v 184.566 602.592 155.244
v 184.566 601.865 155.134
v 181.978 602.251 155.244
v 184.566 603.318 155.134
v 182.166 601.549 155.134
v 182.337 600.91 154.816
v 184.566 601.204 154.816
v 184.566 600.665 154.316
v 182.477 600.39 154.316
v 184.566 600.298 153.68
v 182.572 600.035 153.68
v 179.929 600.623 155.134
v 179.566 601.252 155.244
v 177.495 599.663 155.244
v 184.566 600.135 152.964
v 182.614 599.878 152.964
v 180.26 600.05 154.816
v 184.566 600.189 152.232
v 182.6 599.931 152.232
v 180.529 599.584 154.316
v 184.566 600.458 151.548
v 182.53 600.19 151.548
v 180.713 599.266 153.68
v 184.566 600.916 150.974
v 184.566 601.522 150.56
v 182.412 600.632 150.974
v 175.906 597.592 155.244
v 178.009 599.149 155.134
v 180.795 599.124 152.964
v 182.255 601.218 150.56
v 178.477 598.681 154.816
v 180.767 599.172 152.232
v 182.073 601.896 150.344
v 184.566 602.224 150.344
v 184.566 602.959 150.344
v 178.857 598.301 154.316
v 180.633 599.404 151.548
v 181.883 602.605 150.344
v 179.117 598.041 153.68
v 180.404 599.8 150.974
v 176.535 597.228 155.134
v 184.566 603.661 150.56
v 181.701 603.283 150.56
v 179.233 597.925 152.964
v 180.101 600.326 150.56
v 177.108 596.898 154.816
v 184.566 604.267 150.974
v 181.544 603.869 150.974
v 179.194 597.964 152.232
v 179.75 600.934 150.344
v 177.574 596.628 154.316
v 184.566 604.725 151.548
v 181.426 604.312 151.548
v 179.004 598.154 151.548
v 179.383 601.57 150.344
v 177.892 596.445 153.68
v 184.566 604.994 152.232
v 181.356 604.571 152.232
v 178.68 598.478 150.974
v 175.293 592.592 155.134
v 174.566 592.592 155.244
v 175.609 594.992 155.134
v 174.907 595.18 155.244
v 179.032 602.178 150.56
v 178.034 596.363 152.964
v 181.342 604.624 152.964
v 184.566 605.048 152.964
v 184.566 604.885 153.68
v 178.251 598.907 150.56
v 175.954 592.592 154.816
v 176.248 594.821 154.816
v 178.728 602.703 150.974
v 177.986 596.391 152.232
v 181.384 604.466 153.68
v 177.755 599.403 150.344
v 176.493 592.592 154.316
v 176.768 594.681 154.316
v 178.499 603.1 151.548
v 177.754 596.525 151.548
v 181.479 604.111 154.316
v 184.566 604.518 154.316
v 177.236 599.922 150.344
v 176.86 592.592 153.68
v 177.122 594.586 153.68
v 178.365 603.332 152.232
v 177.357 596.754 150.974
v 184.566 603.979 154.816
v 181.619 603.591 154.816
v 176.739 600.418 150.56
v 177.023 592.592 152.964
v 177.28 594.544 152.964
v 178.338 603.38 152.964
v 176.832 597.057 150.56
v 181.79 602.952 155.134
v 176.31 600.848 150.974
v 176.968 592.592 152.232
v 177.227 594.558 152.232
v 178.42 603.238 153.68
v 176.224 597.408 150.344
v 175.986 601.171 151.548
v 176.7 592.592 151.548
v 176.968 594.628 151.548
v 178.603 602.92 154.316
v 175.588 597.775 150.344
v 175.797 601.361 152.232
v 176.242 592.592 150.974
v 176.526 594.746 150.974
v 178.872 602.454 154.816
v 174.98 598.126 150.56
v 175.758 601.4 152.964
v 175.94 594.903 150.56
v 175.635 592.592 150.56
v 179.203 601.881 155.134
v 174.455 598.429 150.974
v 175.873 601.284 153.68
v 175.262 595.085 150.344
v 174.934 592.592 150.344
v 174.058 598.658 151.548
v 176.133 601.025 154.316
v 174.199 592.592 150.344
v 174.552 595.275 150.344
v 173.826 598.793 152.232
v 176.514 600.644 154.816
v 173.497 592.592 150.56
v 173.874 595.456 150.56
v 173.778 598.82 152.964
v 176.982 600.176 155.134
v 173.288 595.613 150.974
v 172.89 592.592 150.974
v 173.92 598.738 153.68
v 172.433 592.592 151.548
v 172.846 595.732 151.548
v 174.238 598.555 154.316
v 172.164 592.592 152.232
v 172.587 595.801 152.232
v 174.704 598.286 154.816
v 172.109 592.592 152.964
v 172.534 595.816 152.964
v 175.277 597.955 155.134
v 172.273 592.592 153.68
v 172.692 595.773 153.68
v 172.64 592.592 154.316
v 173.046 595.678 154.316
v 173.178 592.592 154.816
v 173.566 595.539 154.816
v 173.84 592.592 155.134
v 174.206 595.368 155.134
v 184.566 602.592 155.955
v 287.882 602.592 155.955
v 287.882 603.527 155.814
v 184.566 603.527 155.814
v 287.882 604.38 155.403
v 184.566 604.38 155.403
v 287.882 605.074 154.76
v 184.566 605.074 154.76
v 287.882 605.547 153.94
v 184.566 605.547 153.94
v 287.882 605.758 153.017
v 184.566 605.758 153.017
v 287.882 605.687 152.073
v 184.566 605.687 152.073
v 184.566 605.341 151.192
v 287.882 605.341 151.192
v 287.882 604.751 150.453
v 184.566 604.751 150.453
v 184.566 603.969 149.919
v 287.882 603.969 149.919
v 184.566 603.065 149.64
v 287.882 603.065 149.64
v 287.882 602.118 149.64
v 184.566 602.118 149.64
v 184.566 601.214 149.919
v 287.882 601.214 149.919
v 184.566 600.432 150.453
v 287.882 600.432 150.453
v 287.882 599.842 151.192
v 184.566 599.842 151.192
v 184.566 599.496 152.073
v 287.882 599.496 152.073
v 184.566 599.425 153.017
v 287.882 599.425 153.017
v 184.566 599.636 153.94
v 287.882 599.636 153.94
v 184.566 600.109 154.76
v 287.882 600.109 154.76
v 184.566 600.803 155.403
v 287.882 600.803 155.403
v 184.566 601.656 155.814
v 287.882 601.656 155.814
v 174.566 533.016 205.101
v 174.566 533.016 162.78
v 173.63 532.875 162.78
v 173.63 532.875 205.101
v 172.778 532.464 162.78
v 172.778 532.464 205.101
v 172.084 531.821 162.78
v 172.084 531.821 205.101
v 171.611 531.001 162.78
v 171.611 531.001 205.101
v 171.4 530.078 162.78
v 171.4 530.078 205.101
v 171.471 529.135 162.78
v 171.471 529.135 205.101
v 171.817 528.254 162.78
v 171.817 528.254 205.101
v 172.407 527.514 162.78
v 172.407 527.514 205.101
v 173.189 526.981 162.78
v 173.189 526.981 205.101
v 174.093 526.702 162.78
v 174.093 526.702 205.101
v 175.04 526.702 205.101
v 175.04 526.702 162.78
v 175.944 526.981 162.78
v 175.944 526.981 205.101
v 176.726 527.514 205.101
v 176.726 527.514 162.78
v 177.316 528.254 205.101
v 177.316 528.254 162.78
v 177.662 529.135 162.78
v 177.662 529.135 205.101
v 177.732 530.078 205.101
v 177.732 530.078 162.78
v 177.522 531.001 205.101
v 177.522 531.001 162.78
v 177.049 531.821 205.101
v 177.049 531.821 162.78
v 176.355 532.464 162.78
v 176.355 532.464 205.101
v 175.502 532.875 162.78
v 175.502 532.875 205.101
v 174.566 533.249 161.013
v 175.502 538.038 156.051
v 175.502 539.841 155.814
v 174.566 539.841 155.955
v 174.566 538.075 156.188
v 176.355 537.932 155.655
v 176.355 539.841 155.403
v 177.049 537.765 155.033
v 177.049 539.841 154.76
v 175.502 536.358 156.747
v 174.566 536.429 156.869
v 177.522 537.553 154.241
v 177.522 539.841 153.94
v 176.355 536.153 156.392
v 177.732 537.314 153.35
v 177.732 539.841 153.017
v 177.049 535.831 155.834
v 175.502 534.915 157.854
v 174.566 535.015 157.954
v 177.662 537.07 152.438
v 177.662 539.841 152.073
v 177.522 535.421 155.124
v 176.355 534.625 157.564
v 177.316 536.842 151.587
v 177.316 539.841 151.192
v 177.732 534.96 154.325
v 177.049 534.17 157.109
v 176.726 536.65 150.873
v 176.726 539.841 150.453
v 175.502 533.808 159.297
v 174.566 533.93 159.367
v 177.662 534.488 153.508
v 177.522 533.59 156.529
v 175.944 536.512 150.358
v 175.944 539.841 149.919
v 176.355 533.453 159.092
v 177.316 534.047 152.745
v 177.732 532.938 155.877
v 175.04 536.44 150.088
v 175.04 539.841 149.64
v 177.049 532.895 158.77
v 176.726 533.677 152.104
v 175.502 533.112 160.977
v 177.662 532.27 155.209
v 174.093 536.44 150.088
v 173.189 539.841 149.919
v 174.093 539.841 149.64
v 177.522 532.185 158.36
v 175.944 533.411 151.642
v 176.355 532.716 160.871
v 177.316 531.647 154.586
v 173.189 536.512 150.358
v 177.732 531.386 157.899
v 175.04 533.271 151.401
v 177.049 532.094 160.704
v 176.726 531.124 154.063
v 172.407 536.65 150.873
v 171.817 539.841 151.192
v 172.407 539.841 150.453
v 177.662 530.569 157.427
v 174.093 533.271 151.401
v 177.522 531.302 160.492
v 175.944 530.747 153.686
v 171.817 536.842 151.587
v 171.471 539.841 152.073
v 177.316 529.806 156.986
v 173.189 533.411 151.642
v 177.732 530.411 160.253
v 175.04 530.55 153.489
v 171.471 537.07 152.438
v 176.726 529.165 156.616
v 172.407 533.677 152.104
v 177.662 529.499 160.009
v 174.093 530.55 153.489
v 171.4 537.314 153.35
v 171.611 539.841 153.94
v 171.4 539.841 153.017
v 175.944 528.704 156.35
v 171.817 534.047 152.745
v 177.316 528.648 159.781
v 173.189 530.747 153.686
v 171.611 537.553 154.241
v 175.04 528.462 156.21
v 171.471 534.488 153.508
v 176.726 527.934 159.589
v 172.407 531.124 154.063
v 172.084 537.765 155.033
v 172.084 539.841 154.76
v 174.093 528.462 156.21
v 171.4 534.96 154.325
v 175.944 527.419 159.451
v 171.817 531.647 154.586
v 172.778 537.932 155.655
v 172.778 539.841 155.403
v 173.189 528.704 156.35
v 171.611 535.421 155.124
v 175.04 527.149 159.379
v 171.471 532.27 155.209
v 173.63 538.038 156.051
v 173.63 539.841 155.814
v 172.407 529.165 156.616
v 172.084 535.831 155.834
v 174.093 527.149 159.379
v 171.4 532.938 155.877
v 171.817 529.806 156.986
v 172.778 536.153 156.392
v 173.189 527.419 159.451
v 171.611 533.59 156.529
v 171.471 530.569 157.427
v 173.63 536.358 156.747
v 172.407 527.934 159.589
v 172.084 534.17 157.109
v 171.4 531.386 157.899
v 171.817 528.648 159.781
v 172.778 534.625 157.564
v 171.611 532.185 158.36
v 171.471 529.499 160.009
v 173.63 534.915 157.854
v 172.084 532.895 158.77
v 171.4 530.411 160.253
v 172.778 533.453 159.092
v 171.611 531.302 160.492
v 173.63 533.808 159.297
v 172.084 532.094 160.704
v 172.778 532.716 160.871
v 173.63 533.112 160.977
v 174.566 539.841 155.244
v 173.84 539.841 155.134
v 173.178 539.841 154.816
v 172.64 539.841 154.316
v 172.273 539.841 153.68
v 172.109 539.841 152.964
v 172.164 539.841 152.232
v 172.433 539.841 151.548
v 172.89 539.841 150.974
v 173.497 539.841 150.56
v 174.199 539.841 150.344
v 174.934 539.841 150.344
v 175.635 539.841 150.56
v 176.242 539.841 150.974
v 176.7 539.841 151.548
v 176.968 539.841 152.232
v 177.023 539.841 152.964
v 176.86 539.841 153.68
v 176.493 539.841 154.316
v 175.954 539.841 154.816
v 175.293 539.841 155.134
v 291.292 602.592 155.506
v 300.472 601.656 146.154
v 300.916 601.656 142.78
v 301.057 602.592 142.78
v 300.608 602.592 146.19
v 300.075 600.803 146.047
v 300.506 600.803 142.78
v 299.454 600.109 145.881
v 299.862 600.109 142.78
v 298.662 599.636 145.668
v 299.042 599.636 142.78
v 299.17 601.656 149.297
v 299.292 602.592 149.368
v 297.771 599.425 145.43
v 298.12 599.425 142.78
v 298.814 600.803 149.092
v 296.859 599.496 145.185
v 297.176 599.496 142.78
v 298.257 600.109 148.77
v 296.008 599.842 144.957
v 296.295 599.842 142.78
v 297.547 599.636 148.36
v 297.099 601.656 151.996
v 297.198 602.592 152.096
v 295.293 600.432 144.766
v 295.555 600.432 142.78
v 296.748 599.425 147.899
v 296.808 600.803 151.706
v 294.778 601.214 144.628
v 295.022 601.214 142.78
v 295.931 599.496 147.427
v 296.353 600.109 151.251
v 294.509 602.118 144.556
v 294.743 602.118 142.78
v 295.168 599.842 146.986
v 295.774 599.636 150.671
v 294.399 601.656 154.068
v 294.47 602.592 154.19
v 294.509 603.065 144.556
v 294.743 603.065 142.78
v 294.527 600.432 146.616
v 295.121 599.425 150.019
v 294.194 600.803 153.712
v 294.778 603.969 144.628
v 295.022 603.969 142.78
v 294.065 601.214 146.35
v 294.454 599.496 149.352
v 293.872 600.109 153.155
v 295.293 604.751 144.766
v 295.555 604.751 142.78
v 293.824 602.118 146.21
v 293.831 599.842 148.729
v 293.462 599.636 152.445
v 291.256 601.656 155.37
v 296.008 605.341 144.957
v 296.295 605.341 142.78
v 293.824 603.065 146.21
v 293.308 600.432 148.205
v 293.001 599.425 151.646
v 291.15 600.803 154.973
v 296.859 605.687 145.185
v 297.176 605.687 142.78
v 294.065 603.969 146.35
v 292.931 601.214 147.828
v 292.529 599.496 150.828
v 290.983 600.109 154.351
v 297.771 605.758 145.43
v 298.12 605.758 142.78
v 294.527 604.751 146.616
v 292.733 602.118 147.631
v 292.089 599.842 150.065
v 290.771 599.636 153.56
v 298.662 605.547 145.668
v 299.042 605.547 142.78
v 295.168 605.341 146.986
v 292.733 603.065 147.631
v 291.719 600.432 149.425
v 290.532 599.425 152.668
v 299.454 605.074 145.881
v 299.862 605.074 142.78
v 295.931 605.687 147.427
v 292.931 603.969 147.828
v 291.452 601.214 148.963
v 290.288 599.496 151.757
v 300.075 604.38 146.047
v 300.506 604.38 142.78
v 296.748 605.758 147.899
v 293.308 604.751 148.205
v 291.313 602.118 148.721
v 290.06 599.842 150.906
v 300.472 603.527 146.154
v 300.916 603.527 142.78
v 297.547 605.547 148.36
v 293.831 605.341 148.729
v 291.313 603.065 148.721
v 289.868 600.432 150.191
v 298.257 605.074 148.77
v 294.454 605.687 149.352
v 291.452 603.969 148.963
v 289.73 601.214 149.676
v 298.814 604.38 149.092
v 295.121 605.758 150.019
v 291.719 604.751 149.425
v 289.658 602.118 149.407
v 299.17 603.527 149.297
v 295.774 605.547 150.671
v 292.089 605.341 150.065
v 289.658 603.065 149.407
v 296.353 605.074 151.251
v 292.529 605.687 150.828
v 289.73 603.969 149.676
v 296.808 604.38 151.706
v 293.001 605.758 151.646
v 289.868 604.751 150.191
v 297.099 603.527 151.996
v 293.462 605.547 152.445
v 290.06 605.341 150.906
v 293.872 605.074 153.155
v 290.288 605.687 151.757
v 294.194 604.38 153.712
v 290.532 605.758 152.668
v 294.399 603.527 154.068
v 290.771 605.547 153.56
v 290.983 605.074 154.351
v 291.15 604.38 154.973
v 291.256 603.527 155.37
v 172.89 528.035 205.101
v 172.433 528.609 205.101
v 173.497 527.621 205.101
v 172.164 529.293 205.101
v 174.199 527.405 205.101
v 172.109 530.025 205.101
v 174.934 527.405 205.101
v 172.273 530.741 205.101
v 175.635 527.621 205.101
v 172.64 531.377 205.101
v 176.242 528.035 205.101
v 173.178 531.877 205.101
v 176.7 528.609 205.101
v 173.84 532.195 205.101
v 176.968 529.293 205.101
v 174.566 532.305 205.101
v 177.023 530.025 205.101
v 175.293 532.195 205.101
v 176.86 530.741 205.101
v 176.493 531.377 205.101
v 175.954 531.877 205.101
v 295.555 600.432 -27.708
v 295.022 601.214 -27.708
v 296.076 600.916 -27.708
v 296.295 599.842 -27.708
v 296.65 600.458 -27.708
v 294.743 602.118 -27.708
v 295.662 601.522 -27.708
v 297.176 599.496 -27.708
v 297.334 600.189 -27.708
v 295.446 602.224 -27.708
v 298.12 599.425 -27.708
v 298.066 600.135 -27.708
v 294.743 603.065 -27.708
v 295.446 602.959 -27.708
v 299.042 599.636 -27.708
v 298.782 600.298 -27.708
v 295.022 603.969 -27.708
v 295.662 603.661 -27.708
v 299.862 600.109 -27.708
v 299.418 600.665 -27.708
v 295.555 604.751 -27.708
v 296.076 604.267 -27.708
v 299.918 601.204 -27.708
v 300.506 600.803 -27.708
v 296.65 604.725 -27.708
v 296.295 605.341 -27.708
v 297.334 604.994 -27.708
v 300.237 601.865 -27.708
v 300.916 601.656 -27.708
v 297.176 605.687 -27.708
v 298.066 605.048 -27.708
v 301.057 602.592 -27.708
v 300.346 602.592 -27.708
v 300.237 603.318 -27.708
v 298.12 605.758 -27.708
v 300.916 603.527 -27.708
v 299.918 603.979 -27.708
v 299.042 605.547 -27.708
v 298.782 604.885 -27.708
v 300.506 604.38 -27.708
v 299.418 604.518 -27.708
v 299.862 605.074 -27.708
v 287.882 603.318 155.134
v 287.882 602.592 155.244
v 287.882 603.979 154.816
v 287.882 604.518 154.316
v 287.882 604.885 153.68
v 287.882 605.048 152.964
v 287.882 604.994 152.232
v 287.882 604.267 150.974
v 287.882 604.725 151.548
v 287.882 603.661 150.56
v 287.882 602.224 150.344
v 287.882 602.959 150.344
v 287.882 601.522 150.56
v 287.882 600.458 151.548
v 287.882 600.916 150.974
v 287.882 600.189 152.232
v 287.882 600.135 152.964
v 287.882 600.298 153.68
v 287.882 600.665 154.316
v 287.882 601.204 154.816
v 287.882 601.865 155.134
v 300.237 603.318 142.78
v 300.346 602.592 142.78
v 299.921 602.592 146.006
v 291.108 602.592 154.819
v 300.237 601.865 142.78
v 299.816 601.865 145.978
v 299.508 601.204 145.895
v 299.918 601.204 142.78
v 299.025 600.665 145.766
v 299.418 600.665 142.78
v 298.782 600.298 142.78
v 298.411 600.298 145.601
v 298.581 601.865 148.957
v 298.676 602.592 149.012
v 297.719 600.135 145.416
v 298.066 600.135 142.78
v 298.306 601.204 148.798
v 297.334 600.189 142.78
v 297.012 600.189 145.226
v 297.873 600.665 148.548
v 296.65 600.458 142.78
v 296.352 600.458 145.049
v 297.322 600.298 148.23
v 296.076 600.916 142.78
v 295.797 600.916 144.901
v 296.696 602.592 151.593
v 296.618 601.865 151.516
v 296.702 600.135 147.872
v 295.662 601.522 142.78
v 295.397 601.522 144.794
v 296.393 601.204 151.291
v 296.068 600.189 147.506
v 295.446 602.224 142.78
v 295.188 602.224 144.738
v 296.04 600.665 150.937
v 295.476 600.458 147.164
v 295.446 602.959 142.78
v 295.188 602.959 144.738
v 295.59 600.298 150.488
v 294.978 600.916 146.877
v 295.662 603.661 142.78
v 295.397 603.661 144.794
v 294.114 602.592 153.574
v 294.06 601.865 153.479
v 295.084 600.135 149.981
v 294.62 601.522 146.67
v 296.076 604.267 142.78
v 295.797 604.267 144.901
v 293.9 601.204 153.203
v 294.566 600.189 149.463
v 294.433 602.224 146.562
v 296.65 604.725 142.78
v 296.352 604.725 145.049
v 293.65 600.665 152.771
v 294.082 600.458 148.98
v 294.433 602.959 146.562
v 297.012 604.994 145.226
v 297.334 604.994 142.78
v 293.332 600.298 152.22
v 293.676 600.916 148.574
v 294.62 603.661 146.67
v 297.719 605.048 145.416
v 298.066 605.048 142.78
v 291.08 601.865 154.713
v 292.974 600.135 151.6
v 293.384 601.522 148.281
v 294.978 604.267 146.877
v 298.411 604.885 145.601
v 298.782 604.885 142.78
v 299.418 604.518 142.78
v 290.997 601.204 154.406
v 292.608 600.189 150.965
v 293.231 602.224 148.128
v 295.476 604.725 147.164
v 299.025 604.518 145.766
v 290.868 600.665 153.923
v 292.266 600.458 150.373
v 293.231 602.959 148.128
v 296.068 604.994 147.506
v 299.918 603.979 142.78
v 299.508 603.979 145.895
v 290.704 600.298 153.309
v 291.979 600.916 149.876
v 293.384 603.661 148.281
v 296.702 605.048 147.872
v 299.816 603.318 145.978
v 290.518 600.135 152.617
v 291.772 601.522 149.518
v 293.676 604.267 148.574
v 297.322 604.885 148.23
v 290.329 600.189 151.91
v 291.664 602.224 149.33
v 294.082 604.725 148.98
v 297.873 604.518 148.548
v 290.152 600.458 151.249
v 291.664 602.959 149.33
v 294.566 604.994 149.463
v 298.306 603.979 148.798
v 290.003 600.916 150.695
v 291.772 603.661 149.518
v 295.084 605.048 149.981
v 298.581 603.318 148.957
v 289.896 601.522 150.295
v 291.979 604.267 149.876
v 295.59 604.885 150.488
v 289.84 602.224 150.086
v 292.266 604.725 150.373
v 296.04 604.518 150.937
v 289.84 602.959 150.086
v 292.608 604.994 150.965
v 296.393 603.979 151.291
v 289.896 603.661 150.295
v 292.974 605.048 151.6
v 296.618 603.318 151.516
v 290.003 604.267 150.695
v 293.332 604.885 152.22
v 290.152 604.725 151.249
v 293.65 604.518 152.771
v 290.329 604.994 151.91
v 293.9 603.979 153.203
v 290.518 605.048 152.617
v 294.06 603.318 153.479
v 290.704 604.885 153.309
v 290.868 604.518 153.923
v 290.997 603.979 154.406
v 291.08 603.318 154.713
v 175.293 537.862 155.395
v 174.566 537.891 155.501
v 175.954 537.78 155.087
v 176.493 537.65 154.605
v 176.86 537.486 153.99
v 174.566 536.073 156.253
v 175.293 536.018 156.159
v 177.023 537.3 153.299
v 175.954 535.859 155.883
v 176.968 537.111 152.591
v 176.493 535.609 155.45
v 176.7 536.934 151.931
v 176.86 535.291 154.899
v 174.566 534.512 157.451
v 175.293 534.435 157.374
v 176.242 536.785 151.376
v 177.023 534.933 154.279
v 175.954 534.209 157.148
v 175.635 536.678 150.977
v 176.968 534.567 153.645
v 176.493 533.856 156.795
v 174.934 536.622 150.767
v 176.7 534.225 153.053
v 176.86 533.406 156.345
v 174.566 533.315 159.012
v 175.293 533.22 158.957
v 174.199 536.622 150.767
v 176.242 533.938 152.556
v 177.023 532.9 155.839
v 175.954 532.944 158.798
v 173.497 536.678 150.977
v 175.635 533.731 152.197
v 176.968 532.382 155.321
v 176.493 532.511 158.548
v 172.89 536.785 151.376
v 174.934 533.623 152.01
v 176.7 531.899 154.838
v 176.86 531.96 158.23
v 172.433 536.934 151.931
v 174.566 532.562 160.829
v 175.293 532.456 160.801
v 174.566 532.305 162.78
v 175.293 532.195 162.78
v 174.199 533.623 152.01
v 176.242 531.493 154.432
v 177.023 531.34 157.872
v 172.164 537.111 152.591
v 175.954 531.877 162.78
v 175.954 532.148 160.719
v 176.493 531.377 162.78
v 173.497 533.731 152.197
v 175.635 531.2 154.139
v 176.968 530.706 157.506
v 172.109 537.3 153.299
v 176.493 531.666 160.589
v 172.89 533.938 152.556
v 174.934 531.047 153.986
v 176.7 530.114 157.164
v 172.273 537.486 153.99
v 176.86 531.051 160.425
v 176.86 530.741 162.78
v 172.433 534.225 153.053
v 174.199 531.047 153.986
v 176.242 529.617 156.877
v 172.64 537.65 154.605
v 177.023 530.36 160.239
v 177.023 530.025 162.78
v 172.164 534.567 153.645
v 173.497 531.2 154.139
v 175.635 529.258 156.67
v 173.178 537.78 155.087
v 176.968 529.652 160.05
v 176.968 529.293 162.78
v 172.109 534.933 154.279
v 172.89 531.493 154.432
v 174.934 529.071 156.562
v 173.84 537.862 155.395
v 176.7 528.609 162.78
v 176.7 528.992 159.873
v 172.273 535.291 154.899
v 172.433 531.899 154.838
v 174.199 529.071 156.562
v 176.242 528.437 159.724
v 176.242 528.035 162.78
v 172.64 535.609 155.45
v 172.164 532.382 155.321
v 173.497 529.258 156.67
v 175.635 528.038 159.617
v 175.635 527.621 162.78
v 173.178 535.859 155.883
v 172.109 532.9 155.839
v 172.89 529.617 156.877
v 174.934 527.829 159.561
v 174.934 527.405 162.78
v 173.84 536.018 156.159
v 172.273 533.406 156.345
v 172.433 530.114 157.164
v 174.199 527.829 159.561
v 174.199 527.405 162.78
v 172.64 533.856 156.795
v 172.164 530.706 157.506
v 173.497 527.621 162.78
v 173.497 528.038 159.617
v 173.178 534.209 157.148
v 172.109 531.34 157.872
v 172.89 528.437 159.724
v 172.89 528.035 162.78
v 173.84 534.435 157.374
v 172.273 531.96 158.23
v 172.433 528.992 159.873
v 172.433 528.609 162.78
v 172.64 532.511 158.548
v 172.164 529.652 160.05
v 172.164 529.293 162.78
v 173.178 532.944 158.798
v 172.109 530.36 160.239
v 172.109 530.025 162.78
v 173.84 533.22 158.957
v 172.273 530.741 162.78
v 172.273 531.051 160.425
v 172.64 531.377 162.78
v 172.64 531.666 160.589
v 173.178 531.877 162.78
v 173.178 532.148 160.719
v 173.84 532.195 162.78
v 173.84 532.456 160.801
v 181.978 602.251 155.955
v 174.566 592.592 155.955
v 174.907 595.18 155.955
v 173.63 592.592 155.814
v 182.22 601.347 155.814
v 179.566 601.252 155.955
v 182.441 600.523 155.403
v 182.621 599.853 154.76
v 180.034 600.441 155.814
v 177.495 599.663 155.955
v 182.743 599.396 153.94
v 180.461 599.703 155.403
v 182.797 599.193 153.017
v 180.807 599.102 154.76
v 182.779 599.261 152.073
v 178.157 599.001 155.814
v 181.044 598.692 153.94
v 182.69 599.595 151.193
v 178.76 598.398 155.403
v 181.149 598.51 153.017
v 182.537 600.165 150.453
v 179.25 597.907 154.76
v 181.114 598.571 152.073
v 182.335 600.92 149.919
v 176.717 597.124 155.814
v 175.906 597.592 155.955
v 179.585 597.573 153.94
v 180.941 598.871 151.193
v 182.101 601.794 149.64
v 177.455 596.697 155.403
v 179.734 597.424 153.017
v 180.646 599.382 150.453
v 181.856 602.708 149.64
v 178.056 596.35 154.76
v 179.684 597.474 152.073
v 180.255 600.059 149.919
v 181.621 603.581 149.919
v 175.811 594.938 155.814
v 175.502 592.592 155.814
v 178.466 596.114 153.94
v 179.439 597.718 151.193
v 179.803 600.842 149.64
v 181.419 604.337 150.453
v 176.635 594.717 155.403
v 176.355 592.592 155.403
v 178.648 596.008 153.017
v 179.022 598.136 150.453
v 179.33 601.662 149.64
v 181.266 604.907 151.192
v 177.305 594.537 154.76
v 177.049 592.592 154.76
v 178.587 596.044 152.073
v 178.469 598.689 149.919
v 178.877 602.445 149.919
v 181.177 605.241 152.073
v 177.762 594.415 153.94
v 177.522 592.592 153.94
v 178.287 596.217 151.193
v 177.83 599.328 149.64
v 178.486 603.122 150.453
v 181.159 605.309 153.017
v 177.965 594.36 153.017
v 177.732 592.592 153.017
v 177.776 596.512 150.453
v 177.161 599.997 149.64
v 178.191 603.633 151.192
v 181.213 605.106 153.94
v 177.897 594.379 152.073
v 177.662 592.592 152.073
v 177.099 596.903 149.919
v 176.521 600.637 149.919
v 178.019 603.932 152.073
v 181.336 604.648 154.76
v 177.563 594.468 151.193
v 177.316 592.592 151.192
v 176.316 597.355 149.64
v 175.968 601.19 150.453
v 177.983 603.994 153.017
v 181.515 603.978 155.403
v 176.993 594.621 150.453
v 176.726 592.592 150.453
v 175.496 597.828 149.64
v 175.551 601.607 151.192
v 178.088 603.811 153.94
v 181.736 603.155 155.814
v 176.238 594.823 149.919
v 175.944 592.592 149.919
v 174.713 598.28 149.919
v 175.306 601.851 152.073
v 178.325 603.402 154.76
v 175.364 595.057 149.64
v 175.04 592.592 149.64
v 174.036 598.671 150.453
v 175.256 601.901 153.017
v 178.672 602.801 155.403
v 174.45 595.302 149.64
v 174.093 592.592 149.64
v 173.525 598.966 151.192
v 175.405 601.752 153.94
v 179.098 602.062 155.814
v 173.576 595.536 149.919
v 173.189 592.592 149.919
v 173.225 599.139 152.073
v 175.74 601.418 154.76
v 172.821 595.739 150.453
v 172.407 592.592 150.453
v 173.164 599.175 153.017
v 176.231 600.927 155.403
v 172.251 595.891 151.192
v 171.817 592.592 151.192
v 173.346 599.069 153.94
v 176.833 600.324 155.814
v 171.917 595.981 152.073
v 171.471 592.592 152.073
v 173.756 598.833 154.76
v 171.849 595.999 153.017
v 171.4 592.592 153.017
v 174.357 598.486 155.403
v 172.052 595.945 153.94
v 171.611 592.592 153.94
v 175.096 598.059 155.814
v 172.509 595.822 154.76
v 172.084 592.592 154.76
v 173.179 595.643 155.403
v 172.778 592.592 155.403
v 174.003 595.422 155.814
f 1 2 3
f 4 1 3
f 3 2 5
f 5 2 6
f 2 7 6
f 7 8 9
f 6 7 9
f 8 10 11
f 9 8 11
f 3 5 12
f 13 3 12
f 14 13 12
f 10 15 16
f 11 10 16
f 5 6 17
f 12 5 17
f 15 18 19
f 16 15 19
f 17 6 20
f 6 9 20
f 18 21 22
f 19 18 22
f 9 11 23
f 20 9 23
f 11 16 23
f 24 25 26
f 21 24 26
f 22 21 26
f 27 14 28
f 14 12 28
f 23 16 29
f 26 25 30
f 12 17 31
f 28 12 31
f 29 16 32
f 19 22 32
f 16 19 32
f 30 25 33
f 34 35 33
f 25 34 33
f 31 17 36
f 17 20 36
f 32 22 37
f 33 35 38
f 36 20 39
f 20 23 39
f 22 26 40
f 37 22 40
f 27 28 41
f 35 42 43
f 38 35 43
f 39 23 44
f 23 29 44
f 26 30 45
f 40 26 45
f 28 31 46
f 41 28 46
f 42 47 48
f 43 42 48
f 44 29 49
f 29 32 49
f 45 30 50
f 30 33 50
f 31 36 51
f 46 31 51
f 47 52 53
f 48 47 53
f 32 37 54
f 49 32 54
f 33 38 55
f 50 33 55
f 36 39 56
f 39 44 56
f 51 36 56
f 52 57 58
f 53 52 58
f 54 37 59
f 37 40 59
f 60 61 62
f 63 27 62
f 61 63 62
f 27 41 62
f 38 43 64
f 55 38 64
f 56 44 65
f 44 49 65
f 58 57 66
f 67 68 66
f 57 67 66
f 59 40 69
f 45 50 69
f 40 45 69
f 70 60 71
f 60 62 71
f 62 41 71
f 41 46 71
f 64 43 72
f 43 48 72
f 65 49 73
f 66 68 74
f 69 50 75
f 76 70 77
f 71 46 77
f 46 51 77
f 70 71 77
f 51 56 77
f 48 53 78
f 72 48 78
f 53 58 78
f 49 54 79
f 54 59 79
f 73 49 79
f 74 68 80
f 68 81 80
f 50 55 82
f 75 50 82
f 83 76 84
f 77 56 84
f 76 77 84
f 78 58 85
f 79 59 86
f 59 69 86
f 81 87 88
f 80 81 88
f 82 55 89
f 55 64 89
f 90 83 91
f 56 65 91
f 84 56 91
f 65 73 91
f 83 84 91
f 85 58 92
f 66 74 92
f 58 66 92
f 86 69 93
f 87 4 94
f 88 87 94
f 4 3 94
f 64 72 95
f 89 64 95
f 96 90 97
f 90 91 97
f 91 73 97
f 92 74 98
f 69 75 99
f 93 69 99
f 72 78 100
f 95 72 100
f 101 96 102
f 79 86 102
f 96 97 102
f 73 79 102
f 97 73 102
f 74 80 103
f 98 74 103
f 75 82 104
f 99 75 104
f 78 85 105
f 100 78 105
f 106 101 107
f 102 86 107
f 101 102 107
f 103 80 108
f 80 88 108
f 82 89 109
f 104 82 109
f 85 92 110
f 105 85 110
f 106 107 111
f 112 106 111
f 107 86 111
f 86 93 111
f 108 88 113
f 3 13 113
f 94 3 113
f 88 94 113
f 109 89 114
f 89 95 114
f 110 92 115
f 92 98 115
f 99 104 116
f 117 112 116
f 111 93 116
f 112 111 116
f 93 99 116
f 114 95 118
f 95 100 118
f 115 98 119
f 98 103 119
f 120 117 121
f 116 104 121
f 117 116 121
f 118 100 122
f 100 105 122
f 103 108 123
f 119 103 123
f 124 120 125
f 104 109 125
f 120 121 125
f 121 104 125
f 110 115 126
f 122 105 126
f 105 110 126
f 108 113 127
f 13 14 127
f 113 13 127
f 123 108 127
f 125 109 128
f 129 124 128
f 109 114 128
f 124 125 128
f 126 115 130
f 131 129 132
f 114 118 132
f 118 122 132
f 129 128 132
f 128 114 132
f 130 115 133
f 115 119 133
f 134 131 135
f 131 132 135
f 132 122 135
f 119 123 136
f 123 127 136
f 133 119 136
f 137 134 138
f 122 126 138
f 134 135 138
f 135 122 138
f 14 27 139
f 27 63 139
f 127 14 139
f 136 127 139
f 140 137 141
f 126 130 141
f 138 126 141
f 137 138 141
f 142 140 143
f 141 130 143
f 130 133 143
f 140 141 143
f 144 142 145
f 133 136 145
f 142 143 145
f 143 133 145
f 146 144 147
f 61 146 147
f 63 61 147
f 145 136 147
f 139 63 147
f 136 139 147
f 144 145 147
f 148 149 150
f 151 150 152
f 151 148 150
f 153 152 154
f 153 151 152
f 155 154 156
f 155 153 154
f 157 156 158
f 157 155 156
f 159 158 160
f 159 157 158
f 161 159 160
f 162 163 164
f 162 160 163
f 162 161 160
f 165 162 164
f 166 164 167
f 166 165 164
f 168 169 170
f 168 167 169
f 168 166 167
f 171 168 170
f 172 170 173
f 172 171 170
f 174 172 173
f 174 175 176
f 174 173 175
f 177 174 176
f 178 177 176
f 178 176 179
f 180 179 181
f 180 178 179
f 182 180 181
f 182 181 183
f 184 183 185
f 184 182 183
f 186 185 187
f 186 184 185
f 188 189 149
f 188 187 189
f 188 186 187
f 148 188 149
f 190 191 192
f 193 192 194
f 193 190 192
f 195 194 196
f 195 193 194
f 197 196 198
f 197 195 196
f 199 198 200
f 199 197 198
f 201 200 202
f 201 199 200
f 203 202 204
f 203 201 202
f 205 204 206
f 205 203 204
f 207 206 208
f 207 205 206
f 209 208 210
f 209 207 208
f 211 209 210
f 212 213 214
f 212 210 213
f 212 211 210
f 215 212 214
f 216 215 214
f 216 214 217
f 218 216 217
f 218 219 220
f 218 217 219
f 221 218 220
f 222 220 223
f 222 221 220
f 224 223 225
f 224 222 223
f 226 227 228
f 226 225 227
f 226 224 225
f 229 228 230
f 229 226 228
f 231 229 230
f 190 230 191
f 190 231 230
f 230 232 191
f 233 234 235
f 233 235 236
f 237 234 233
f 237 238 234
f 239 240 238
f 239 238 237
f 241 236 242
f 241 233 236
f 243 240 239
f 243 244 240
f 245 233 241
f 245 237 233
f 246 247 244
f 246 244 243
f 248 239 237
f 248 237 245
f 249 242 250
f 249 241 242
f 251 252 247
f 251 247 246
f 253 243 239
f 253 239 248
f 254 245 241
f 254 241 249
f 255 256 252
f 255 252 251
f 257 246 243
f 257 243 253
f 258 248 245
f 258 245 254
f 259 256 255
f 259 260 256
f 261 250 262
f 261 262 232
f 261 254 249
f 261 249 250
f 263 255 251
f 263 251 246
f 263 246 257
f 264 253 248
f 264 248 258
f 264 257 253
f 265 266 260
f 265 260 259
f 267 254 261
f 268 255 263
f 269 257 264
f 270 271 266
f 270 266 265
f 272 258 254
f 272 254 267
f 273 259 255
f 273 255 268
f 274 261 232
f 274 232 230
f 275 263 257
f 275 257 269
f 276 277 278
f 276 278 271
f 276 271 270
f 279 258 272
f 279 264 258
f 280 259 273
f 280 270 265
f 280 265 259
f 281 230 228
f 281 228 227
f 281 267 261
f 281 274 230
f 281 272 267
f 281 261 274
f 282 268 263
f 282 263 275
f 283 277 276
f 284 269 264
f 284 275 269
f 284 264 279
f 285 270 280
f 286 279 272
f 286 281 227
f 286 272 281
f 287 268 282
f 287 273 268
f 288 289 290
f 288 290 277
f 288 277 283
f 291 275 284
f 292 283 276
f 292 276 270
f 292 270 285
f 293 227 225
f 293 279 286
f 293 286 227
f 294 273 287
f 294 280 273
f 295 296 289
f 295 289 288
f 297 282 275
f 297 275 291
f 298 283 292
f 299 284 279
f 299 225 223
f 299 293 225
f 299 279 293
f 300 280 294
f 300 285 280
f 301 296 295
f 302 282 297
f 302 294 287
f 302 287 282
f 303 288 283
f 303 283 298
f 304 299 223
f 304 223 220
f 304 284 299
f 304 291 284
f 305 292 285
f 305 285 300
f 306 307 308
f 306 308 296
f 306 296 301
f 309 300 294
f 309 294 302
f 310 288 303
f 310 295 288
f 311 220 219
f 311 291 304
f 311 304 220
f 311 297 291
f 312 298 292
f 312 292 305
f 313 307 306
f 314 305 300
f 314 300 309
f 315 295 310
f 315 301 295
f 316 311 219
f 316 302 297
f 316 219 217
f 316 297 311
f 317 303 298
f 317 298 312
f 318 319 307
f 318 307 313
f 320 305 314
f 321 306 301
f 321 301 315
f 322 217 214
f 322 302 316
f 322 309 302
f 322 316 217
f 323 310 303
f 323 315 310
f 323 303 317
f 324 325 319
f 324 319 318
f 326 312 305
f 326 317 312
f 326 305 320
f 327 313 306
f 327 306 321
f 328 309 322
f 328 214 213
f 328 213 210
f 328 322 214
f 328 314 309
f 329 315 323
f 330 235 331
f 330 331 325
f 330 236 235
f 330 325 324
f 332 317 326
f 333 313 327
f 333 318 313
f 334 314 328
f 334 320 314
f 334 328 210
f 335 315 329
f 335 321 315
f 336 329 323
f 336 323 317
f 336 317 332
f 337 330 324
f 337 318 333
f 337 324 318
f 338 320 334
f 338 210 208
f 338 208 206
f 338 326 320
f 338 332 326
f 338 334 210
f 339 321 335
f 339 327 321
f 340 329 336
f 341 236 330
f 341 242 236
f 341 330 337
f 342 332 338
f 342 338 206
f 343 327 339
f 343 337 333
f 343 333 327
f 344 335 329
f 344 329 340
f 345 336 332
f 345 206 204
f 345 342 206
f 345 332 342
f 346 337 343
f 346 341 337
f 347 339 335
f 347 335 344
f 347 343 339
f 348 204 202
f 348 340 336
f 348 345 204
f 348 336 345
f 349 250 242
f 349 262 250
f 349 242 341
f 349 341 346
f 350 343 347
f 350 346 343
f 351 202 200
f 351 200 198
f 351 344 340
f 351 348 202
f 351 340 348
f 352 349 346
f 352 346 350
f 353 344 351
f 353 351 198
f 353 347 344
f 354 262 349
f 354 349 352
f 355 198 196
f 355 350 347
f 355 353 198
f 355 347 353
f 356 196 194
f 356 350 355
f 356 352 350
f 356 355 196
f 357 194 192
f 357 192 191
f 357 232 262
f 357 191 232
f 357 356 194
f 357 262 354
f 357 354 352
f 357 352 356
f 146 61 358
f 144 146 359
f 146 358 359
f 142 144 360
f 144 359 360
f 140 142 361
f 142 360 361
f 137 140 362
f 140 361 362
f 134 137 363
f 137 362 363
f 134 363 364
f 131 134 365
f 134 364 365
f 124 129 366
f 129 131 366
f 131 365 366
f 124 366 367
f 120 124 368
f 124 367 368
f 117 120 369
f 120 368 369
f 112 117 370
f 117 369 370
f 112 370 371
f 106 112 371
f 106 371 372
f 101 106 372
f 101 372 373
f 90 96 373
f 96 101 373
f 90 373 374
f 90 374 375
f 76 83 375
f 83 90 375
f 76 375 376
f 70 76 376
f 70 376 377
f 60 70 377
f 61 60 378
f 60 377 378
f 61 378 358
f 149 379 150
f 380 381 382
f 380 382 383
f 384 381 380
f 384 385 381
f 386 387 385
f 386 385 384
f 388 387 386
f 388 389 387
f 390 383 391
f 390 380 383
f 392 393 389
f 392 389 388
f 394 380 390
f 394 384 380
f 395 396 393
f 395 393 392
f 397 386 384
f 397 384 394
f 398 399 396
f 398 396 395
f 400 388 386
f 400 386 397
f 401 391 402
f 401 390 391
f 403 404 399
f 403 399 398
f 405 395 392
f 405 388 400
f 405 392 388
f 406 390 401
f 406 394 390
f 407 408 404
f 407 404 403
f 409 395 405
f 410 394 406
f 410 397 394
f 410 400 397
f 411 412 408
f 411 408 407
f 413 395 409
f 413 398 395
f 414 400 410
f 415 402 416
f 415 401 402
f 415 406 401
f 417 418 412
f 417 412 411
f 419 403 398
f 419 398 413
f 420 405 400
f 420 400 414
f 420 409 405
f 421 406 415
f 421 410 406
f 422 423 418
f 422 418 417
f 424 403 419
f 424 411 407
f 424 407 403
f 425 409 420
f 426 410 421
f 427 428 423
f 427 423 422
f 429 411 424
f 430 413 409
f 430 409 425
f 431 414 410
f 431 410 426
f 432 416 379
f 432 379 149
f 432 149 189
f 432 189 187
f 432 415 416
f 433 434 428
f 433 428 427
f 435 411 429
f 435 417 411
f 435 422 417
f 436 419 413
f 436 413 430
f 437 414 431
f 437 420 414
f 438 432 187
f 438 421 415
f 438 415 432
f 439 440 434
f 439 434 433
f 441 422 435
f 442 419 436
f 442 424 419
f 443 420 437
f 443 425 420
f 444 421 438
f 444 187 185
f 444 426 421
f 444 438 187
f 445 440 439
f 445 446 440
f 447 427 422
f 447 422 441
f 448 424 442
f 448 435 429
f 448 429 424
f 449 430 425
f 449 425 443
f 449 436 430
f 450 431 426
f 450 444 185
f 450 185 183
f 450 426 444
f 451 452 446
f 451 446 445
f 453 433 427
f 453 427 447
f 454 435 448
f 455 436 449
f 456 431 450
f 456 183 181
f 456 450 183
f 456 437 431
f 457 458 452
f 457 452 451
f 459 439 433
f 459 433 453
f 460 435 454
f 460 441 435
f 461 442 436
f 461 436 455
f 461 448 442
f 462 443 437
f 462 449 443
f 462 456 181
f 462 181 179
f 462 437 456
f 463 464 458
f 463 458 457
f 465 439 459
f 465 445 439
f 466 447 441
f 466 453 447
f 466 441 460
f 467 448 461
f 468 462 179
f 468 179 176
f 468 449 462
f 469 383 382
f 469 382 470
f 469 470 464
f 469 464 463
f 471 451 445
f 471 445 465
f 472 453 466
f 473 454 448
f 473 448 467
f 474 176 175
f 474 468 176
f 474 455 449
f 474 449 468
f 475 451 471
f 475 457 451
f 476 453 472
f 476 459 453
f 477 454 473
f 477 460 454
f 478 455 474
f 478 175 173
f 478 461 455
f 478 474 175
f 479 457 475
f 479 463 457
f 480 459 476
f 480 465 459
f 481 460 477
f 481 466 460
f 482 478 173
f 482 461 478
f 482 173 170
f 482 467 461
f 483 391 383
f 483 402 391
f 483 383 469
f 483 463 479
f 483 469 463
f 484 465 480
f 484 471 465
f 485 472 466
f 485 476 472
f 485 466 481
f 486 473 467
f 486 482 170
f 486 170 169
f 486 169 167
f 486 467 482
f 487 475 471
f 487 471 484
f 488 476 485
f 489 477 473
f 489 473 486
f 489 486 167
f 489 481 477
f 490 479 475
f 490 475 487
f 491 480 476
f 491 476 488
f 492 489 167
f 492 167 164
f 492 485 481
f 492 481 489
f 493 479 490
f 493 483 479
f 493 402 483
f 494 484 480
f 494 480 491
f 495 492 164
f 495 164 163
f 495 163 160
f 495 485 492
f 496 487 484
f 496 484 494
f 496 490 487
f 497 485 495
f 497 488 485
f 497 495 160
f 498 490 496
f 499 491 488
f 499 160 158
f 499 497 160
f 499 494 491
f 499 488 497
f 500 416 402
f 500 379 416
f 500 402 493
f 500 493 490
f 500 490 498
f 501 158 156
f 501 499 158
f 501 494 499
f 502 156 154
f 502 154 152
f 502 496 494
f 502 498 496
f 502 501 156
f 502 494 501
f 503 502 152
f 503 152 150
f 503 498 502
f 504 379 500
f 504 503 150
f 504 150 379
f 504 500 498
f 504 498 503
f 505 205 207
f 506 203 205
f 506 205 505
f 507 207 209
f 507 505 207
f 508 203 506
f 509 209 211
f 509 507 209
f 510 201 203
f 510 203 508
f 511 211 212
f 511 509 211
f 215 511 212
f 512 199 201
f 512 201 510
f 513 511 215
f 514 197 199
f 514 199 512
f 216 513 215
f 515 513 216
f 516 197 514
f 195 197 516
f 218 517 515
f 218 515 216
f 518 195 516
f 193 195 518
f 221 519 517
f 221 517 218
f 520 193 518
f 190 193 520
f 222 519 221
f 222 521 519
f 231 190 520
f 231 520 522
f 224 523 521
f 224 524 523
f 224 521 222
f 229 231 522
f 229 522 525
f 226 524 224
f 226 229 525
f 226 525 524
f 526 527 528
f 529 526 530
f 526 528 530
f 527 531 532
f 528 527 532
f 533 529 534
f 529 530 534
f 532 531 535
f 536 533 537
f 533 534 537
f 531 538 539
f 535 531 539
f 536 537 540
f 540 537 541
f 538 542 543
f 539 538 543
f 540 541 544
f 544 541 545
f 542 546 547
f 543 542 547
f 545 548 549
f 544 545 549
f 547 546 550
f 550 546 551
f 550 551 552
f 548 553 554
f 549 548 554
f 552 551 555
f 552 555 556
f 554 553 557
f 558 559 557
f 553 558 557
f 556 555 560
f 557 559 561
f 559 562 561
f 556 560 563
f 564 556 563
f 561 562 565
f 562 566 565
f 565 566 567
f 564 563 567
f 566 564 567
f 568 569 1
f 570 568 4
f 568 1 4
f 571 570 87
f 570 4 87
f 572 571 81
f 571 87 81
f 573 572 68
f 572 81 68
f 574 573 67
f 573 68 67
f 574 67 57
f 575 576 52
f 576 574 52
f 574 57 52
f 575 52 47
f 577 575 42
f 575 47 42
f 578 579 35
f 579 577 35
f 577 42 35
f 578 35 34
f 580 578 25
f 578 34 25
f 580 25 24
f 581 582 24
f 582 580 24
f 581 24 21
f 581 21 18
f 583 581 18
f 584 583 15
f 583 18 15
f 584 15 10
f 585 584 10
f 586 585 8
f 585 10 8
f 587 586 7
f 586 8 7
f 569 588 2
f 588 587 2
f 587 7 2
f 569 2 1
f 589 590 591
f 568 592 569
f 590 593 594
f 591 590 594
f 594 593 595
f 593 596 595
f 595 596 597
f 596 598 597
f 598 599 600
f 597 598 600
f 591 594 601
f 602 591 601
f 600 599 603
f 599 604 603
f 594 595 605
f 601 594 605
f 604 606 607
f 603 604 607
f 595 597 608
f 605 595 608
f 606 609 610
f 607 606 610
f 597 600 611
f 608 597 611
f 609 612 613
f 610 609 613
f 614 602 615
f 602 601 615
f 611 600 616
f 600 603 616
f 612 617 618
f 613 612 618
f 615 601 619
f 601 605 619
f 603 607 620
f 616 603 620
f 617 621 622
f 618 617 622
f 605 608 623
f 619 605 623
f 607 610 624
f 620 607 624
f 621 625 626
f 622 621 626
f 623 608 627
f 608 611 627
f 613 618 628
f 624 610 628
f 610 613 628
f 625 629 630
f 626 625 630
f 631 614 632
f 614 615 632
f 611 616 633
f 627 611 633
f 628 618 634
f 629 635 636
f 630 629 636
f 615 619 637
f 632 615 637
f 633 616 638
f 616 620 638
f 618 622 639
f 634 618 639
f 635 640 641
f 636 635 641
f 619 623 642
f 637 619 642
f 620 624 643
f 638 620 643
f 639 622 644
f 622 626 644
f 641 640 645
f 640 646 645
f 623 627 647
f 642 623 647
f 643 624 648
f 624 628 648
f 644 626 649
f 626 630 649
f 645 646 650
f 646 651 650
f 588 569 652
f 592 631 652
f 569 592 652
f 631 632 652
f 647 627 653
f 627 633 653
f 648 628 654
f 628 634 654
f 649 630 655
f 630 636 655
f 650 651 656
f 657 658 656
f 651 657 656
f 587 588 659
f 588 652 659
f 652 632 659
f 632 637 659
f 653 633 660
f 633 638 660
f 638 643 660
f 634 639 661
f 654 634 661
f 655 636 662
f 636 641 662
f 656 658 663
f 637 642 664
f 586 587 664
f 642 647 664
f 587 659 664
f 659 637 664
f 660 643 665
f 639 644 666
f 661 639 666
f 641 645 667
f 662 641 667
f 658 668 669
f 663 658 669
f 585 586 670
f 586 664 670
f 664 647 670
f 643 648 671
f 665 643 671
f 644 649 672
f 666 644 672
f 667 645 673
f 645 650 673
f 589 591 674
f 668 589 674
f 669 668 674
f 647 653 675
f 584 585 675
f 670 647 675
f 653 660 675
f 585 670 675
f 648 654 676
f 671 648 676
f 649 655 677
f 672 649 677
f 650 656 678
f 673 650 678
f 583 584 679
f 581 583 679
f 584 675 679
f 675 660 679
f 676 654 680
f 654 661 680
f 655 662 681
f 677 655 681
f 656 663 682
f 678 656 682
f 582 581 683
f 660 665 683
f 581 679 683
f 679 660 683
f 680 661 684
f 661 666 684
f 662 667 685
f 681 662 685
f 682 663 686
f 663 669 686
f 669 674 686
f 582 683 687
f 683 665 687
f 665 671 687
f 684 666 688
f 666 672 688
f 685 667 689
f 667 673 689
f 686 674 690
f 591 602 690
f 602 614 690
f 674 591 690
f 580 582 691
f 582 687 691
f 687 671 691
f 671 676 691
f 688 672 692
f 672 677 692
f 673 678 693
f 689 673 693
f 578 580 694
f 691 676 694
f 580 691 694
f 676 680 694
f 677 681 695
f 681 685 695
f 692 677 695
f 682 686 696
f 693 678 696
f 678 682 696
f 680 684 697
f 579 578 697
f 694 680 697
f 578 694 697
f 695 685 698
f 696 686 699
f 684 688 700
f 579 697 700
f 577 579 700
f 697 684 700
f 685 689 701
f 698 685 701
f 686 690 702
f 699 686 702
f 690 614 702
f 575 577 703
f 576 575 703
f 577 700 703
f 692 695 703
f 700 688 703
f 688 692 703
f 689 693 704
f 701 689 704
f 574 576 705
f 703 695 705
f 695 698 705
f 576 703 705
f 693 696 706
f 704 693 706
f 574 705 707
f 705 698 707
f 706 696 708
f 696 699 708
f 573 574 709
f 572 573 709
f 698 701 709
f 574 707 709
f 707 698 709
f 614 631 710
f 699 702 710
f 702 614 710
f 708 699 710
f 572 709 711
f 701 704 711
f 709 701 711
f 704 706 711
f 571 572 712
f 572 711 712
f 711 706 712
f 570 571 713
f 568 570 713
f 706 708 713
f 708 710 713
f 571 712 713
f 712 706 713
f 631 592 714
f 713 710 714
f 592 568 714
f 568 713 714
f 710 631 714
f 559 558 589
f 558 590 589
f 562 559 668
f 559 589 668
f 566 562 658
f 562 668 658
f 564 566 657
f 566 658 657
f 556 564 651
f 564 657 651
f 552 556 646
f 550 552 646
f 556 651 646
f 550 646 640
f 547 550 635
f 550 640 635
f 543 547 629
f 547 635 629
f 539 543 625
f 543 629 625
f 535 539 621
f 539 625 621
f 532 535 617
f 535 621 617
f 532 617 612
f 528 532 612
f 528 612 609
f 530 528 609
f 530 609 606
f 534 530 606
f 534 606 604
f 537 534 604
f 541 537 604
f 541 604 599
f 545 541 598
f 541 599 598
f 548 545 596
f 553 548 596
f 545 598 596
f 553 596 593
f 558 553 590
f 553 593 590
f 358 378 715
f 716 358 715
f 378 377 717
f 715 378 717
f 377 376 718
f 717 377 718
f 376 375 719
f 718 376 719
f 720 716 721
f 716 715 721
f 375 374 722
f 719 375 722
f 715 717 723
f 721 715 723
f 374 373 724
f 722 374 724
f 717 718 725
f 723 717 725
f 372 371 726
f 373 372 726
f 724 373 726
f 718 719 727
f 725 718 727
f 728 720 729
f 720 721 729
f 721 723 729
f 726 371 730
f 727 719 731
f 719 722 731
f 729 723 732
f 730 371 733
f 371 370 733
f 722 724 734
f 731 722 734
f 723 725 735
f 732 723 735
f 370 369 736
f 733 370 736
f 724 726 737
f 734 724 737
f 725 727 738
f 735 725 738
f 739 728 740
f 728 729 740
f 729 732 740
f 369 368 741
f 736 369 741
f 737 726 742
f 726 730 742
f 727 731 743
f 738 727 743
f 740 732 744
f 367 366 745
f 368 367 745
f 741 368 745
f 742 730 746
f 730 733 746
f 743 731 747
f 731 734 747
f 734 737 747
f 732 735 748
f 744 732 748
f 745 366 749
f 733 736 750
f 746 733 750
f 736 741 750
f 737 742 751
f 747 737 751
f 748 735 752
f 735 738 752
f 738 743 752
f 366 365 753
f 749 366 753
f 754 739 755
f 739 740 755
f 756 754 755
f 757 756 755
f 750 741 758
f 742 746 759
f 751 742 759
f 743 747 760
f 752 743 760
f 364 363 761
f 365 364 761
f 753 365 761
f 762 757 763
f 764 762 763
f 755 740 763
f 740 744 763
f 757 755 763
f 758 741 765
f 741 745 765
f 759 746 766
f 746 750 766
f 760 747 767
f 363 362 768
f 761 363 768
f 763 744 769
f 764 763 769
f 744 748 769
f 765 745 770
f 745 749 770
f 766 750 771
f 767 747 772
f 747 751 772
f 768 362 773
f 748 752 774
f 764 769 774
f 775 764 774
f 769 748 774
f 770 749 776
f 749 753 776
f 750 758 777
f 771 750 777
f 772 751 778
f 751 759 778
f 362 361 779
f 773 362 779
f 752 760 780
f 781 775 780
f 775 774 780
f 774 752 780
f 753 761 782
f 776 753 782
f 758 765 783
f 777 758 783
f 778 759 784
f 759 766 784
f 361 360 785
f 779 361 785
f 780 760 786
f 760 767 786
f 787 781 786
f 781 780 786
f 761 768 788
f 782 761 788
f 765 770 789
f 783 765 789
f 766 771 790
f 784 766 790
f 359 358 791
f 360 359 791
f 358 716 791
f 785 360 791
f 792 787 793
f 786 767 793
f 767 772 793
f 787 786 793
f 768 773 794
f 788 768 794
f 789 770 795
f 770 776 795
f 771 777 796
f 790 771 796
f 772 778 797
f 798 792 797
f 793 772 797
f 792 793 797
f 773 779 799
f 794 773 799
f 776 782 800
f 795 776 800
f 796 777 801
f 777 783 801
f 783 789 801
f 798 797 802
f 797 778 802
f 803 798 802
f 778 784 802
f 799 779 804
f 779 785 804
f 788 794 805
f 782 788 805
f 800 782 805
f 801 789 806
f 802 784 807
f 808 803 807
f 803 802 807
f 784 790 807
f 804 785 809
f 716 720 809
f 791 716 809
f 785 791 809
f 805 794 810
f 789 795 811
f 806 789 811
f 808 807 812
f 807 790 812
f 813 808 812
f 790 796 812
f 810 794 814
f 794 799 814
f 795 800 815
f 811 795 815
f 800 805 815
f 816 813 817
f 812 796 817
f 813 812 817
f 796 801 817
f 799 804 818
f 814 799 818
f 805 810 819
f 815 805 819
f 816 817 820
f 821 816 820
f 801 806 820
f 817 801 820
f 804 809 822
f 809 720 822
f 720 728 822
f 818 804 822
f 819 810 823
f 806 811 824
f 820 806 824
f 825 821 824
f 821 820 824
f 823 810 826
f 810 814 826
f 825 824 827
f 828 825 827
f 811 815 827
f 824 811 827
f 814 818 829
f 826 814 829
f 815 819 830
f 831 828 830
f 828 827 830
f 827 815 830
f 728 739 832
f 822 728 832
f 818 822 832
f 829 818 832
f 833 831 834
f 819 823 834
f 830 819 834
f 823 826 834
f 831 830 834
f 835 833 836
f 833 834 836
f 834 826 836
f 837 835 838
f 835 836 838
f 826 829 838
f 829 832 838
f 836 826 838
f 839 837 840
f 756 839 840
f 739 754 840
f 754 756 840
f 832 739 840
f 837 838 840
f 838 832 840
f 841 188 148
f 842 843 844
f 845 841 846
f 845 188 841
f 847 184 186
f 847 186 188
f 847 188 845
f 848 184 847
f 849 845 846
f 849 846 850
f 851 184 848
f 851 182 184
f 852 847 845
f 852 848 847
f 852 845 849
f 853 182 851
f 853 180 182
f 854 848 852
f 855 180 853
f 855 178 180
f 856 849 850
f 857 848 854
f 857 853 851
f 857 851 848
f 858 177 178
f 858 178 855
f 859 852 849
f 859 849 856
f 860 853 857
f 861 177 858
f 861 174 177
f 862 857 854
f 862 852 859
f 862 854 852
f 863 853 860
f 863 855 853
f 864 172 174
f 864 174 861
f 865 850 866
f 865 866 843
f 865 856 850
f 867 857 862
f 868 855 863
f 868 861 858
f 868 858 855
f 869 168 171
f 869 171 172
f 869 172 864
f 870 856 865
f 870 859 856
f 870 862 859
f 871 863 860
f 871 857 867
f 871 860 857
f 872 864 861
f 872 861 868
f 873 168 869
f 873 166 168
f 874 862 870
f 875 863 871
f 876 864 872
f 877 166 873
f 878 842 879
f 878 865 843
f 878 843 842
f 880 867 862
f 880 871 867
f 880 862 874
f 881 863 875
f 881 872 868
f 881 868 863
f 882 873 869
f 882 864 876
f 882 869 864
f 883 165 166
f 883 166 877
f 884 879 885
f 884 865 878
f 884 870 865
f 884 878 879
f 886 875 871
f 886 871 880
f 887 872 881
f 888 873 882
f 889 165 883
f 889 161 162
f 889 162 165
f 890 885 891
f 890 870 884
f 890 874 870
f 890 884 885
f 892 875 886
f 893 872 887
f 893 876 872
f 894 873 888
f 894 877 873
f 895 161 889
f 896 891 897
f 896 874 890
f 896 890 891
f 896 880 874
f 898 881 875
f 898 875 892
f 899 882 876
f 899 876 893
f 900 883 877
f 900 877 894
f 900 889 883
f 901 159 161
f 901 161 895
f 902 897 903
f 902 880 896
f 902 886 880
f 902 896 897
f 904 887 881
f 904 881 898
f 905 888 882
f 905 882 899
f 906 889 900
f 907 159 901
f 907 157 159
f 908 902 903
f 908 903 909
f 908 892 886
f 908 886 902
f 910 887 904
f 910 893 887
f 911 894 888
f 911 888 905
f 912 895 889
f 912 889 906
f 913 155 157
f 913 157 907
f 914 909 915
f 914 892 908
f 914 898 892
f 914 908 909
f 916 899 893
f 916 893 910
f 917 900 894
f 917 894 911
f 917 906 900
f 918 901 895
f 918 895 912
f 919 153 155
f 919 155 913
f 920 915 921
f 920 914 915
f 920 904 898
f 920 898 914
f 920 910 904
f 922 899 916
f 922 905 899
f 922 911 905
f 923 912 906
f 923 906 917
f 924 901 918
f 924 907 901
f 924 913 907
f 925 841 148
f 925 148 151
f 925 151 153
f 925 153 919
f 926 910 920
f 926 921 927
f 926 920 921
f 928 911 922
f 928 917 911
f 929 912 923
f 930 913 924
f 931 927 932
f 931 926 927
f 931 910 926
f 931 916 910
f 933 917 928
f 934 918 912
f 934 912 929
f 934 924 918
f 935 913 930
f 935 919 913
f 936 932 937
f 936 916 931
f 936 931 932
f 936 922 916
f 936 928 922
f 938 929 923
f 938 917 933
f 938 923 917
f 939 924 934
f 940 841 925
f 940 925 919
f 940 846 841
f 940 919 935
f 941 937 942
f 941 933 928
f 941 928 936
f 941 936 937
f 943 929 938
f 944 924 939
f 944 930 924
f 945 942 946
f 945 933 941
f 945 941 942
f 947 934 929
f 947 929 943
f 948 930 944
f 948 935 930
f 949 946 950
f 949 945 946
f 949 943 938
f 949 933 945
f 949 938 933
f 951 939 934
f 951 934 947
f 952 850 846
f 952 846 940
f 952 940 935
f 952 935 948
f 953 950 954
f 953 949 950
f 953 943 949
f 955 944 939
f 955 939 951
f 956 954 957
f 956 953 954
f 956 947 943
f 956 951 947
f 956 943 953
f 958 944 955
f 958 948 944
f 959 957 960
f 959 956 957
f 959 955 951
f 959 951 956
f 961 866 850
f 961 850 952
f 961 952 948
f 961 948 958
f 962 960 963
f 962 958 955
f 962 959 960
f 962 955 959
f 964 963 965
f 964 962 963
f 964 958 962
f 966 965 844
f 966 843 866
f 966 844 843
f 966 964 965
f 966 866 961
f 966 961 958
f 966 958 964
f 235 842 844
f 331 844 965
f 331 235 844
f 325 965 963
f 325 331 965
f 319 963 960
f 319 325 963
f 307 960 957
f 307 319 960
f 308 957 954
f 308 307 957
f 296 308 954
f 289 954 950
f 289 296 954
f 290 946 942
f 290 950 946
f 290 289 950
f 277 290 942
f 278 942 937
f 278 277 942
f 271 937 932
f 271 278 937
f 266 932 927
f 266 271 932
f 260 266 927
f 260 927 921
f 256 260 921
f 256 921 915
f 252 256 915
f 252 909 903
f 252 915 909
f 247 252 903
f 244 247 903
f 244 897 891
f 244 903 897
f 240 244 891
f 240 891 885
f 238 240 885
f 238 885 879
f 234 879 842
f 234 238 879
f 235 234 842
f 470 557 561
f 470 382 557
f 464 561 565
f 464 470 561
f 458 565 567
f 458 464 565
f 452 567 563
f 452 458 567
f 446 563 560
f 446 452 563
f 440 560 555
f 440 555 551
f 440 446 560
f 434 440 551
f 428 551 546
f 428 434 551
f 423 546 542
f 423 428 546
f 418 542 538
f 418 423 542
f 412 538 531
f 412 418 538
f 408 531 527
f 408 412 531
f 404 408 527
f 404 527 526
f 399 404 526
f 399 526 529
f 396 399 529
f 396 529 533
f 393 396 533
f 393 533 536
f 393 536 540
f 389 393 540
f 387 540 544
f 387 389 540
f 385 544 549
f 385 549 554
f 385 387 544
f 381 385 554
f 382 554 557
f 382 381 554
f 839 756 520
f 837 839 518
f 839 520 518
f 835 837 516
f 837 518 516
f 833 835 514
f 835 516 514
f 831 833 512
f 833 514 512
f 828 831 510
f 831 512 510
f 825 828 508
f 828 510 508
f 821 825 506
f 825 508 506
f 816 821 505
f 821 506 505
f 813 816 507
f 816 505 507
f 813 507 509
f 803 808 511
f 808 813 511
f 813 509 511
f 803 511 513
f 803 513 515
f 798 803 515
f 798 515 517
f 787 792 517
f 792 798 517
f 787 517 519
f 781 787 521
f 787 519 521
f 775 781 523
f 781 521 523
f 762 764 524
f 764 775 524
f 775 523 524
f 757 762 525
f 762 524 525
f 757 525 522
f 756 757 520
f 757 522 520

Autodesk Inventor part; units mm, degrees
ref_plane "YZ Plane" through (0, 0, 0) normal (1, 0, 0) x (0, 1, 0)
ref_plane "XZ Plane" through (0, 0, 0) normal (0, 1, 0) x (-1, 0, 0)
ref_plane "Work Plane3" through (297.8823, 602.5915, -27.7083) normal (0, 0, 1) x (1, 0, 0)
sketch "Sketch3" plane through (297.8823, 602.5915, -27.7083) normal (0, 0, 1) x (1, 0, 0)
  circle A0 centre (0, 0) radius 3.175
  circle A1 centre (0, 0) radius 2.4638
sketch3d "3D Sketch1"
  line L0 (297.8823, 602.5915, -27.7083) -> (297.8823, 602.5915, 142.7801)
  arc A0 (297.8823, 602.5915, 142.7801) -> (287.8824, 602.5915, 152.78) centre (287.8824, 602.5915, 142.7801) ccw
  line L1 (287.8824, 602.5915, 152.78) -> (184.5662, 602.5915, 152.78)
  arc A1 (184.5662, 602.5915, 152.78) -> (174.5663, 592.5916, 152.78) centre (184.5662, 592.5916, 152.78) ccw
  line L2 (174.5663, 592.5916, 152.78) -> (174.5663, 539.841, 152.78)
  arc A2 (174.5663, 539.841, 152.78) -> (174.5663, 529.8411, 162.7799) centre (174.5663, 539.841, 162.7799) ccw
  line L3 (174.5663, 529.8411, 162.7799) -> (174.5663, 529.8411, 205.1013)
  dimension "d7" = 9.9999
  dimension "d6" = 9.9999
  dimension "d8" = 9.9999
sweep "Sweep1" add profiles "Sketch3" path "3D Sketch1"
equation "\"OD\" = 6.35"
equation "\"t\" = 0.7112"
equation "\"L\" = PL"
equation "\"ID\" = 4.9276"
equation "\"PL\" = 416.0012"
equation "\"D\" = 15.24"
equation "\"Size_Designation\" = 1.2345"
properties material "Stainless Steel"
